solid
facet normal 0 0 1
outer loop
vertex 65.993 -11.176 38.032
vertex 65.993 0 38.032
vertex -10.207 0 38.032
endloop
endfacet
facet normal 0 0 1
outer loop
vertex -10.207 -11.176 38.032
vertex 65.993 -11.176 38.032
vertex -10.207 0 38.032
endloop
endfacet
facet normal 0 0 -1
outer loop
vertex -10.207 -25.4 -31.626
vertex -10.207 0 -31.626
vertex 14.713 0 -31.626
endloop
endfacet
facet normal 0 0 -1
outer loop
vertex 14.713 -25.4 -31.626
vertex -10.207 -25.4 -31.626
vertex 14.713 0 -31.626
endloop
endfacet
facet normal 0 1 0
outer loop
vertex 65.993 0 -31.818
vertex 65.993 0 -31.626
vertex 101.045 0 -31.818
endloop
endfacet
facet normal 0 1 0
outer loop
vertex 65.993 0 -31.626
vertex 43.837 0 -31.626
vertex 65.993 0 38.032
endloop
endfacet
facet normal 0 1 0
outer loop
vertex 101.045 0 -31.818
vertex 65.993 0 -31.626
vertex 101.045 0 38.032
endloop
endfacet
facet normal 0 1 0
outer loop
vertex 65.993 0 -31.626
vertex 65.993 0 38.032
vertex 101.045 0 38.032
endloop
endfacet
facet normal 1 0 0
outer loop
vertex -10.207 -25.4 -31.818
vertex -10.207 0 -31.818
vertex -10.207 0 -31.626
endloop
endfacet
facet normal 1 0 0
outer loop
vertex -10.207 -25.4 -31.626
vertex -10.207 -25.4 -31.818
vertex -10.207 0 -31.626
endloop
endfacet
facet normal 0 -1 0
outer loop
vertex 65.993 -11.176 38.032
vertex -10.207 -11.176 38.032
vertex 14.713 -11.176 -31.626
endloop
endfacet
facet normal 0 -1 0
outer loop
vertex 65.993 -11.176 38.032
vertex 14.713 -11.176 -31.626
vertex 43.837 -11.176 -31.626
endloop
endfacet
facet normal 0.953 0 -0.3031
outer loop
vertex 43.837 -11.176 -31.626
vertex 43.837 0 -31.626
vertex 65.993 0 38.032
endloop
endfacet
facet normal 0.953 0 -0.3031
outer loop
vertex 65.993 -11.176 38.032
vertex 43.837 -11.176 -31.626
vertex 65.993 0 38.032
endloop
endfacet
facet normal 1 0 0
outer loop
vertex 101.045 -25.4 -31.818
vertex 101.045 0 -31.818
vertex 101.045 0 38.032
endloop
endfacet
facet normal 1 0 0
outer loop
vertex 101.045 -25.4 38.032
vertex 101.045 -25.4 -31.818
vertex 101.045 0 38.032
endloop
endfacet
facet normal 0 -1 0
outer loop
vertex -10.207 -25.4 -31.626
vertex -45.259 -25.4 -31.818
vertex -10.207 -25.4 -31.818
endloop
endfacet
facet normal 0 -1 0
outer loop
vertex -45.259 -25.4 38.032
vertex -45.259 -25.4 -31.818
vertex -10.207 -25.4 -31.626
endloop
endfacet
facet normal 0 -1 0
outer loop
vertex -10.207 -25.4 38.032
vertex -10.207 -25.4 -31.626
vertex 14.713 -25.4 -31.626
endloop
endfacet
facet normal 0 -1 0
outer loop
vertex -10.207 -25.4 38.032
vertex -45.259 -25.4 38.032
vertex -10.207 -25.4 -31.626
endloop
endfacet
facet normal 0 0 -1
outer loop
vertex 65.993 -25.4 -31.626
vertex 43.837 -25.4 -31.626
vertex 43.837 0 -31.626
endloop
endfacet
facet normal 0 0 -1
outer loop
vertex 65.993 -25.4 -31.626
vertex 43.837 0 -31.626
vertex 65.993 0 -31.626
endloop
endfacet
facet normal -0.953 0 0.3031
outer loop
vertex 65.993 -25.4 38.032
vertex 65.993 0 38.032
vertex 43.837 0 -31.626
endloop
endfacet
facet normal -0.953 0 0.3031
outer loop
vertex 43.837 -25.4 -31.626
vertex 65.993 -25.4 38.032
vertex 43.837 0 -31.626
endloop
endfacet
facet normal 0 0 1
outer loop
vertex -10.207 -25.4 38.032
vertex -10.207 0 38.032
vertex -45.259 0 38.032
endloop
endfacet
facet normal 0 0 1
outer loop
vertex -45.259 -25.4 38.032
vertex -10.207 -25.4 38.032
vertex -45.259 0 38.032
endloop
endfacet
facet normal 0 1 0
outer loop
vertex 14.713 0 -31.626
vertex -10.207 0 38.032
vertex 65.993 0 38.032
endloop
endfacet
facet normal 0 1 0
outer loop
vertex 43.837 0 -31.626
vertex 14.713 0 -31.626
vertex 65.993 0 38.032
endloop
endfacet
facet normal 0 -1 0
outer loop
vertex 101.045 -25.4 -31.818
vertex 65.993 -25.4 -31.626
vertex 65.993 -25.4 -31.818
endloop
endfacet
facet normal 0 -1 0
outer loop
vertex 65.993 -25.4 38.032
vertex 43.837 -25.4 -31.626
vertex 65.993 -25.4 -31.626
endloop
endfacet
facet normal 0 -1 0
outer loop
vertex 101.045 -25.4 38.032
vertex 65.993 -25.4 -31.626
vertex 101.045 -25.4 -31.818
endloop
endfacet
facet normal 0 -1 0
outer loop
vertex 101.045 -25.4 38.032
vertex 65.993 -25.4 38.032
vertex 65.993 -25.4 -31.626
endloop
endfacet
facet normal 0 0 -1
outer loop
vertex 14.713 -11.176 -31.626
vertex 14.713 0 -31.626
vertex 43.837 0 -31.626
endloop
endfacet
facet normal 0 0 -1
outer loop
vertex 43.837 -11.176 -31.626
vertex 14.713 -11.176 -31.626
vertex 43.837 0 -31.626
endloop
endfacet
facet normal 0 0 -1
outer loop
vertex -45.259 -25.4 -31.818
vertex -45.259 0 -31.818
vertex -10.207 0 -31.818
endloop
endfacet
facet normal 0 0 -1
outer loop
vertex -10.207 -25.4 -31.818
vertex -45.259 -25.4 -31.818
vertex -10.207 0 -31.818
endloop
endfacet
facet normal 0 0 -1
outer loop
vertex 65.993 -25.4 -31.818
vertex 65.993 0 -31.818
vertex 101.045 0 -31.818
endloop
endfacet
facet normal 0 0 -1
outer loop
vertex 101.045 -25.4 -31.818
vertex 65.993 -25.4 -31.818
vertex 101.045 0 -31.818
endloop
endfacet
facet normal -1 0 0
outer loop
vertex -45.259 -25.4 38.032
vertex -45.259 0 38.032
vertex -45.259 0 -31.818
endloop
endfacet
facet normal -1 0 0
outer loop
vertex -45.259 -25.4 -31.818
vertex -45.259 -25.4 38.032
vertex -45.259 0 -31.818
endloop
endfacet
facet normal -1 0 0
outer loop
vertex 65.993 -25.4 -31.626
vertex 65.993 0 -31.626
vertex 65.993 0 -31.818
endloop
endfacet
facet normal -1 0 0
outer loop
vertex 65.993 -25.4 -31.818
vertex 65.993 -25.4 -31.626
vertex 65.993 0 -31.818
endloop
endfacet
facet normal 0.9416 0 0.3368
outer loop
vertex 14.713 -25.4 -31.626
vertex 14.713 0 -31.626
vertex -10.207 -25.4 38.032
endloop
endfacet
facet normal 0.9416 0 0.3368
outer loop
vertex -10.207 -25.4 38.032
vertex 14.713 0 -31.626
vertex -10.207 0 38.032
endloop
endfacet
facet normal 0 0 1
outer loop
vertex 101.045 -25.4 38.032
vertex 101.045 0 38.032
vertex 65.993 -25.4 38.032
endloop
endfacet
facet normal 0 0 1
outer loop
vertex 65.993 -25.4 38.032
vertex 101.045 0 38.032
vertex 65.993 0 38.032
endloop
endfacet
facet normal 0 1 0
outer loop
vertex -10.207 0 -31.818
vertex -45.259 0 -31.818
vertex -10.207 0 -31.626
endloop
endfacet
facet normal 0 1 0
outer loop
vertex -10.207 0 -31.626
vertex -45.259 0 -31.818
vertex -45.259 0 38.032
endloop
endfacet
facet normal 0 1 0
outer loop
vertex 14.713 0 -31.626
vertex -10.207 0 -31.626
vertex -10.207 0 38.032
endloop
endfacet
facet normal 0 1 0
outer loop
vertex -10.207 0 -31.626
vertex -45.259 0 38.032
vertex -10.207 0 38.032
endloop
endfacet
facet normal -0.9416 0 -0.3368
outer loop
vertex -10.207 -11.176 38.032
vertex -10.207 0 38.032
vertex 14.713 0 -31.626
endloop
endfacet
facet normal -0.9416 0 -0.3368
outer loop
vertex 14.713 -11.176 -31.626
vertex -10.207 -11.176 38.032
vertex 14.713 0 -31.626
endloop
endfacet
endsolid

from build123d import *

# Parameters (mm, degrees)
F1_DEPTH = 25.4
F3_DEPTH = 11.176


# Not quite as in the source:
# - a feature of the source that left no trace in its solid (it failed there, or was rolled back) is left out


with BuildPart() as f1:
    # F0 (on Front) → F1 (new body)
    with BuildSketch(Plane.XZ):
        Polygon((-10.2070893071, 38.031912598), (-45.2590893071, 38.031912598), (-45.2590893071, -31.818087402), (-10.2070893071, -31.818087402), (-10.2070893071, -31.6261931479), (14.7131280974, -31.6261931479), align=None)
    extrude(amount=F1_DEPTH)


with BuildPart() as f1b:
    # F0 (on Front) → F1, piece 2 (new body)
    with BuildSketch(Plane.XZ):
        Polygon((101.0449106929, 38.031912598), (65.9929106929, 38.031912598), (43.8374243677, -31.6261931479), (65.9929106929, -31.6261931479), (65.9929106929, -31.818087402), (101.0449106929, -31.818087402), align=None)
    extrude(amount=F1_DEPTH)


with BuildPart() as f3:
    # F0 (on Front) → F3 (new body)
    with BuildSketch(Plane.XZ):
        Polygon((65.9929106929, 38.031912598), (-10.2070893071, 38.031912598), (14.7131280974, -31.6261931479), (43.8374243677, -31.6261931479), align=None)
    extrude(amount=F3_DEPTH)


solid = Compound([f1.part, f1b.part, f3.part])
